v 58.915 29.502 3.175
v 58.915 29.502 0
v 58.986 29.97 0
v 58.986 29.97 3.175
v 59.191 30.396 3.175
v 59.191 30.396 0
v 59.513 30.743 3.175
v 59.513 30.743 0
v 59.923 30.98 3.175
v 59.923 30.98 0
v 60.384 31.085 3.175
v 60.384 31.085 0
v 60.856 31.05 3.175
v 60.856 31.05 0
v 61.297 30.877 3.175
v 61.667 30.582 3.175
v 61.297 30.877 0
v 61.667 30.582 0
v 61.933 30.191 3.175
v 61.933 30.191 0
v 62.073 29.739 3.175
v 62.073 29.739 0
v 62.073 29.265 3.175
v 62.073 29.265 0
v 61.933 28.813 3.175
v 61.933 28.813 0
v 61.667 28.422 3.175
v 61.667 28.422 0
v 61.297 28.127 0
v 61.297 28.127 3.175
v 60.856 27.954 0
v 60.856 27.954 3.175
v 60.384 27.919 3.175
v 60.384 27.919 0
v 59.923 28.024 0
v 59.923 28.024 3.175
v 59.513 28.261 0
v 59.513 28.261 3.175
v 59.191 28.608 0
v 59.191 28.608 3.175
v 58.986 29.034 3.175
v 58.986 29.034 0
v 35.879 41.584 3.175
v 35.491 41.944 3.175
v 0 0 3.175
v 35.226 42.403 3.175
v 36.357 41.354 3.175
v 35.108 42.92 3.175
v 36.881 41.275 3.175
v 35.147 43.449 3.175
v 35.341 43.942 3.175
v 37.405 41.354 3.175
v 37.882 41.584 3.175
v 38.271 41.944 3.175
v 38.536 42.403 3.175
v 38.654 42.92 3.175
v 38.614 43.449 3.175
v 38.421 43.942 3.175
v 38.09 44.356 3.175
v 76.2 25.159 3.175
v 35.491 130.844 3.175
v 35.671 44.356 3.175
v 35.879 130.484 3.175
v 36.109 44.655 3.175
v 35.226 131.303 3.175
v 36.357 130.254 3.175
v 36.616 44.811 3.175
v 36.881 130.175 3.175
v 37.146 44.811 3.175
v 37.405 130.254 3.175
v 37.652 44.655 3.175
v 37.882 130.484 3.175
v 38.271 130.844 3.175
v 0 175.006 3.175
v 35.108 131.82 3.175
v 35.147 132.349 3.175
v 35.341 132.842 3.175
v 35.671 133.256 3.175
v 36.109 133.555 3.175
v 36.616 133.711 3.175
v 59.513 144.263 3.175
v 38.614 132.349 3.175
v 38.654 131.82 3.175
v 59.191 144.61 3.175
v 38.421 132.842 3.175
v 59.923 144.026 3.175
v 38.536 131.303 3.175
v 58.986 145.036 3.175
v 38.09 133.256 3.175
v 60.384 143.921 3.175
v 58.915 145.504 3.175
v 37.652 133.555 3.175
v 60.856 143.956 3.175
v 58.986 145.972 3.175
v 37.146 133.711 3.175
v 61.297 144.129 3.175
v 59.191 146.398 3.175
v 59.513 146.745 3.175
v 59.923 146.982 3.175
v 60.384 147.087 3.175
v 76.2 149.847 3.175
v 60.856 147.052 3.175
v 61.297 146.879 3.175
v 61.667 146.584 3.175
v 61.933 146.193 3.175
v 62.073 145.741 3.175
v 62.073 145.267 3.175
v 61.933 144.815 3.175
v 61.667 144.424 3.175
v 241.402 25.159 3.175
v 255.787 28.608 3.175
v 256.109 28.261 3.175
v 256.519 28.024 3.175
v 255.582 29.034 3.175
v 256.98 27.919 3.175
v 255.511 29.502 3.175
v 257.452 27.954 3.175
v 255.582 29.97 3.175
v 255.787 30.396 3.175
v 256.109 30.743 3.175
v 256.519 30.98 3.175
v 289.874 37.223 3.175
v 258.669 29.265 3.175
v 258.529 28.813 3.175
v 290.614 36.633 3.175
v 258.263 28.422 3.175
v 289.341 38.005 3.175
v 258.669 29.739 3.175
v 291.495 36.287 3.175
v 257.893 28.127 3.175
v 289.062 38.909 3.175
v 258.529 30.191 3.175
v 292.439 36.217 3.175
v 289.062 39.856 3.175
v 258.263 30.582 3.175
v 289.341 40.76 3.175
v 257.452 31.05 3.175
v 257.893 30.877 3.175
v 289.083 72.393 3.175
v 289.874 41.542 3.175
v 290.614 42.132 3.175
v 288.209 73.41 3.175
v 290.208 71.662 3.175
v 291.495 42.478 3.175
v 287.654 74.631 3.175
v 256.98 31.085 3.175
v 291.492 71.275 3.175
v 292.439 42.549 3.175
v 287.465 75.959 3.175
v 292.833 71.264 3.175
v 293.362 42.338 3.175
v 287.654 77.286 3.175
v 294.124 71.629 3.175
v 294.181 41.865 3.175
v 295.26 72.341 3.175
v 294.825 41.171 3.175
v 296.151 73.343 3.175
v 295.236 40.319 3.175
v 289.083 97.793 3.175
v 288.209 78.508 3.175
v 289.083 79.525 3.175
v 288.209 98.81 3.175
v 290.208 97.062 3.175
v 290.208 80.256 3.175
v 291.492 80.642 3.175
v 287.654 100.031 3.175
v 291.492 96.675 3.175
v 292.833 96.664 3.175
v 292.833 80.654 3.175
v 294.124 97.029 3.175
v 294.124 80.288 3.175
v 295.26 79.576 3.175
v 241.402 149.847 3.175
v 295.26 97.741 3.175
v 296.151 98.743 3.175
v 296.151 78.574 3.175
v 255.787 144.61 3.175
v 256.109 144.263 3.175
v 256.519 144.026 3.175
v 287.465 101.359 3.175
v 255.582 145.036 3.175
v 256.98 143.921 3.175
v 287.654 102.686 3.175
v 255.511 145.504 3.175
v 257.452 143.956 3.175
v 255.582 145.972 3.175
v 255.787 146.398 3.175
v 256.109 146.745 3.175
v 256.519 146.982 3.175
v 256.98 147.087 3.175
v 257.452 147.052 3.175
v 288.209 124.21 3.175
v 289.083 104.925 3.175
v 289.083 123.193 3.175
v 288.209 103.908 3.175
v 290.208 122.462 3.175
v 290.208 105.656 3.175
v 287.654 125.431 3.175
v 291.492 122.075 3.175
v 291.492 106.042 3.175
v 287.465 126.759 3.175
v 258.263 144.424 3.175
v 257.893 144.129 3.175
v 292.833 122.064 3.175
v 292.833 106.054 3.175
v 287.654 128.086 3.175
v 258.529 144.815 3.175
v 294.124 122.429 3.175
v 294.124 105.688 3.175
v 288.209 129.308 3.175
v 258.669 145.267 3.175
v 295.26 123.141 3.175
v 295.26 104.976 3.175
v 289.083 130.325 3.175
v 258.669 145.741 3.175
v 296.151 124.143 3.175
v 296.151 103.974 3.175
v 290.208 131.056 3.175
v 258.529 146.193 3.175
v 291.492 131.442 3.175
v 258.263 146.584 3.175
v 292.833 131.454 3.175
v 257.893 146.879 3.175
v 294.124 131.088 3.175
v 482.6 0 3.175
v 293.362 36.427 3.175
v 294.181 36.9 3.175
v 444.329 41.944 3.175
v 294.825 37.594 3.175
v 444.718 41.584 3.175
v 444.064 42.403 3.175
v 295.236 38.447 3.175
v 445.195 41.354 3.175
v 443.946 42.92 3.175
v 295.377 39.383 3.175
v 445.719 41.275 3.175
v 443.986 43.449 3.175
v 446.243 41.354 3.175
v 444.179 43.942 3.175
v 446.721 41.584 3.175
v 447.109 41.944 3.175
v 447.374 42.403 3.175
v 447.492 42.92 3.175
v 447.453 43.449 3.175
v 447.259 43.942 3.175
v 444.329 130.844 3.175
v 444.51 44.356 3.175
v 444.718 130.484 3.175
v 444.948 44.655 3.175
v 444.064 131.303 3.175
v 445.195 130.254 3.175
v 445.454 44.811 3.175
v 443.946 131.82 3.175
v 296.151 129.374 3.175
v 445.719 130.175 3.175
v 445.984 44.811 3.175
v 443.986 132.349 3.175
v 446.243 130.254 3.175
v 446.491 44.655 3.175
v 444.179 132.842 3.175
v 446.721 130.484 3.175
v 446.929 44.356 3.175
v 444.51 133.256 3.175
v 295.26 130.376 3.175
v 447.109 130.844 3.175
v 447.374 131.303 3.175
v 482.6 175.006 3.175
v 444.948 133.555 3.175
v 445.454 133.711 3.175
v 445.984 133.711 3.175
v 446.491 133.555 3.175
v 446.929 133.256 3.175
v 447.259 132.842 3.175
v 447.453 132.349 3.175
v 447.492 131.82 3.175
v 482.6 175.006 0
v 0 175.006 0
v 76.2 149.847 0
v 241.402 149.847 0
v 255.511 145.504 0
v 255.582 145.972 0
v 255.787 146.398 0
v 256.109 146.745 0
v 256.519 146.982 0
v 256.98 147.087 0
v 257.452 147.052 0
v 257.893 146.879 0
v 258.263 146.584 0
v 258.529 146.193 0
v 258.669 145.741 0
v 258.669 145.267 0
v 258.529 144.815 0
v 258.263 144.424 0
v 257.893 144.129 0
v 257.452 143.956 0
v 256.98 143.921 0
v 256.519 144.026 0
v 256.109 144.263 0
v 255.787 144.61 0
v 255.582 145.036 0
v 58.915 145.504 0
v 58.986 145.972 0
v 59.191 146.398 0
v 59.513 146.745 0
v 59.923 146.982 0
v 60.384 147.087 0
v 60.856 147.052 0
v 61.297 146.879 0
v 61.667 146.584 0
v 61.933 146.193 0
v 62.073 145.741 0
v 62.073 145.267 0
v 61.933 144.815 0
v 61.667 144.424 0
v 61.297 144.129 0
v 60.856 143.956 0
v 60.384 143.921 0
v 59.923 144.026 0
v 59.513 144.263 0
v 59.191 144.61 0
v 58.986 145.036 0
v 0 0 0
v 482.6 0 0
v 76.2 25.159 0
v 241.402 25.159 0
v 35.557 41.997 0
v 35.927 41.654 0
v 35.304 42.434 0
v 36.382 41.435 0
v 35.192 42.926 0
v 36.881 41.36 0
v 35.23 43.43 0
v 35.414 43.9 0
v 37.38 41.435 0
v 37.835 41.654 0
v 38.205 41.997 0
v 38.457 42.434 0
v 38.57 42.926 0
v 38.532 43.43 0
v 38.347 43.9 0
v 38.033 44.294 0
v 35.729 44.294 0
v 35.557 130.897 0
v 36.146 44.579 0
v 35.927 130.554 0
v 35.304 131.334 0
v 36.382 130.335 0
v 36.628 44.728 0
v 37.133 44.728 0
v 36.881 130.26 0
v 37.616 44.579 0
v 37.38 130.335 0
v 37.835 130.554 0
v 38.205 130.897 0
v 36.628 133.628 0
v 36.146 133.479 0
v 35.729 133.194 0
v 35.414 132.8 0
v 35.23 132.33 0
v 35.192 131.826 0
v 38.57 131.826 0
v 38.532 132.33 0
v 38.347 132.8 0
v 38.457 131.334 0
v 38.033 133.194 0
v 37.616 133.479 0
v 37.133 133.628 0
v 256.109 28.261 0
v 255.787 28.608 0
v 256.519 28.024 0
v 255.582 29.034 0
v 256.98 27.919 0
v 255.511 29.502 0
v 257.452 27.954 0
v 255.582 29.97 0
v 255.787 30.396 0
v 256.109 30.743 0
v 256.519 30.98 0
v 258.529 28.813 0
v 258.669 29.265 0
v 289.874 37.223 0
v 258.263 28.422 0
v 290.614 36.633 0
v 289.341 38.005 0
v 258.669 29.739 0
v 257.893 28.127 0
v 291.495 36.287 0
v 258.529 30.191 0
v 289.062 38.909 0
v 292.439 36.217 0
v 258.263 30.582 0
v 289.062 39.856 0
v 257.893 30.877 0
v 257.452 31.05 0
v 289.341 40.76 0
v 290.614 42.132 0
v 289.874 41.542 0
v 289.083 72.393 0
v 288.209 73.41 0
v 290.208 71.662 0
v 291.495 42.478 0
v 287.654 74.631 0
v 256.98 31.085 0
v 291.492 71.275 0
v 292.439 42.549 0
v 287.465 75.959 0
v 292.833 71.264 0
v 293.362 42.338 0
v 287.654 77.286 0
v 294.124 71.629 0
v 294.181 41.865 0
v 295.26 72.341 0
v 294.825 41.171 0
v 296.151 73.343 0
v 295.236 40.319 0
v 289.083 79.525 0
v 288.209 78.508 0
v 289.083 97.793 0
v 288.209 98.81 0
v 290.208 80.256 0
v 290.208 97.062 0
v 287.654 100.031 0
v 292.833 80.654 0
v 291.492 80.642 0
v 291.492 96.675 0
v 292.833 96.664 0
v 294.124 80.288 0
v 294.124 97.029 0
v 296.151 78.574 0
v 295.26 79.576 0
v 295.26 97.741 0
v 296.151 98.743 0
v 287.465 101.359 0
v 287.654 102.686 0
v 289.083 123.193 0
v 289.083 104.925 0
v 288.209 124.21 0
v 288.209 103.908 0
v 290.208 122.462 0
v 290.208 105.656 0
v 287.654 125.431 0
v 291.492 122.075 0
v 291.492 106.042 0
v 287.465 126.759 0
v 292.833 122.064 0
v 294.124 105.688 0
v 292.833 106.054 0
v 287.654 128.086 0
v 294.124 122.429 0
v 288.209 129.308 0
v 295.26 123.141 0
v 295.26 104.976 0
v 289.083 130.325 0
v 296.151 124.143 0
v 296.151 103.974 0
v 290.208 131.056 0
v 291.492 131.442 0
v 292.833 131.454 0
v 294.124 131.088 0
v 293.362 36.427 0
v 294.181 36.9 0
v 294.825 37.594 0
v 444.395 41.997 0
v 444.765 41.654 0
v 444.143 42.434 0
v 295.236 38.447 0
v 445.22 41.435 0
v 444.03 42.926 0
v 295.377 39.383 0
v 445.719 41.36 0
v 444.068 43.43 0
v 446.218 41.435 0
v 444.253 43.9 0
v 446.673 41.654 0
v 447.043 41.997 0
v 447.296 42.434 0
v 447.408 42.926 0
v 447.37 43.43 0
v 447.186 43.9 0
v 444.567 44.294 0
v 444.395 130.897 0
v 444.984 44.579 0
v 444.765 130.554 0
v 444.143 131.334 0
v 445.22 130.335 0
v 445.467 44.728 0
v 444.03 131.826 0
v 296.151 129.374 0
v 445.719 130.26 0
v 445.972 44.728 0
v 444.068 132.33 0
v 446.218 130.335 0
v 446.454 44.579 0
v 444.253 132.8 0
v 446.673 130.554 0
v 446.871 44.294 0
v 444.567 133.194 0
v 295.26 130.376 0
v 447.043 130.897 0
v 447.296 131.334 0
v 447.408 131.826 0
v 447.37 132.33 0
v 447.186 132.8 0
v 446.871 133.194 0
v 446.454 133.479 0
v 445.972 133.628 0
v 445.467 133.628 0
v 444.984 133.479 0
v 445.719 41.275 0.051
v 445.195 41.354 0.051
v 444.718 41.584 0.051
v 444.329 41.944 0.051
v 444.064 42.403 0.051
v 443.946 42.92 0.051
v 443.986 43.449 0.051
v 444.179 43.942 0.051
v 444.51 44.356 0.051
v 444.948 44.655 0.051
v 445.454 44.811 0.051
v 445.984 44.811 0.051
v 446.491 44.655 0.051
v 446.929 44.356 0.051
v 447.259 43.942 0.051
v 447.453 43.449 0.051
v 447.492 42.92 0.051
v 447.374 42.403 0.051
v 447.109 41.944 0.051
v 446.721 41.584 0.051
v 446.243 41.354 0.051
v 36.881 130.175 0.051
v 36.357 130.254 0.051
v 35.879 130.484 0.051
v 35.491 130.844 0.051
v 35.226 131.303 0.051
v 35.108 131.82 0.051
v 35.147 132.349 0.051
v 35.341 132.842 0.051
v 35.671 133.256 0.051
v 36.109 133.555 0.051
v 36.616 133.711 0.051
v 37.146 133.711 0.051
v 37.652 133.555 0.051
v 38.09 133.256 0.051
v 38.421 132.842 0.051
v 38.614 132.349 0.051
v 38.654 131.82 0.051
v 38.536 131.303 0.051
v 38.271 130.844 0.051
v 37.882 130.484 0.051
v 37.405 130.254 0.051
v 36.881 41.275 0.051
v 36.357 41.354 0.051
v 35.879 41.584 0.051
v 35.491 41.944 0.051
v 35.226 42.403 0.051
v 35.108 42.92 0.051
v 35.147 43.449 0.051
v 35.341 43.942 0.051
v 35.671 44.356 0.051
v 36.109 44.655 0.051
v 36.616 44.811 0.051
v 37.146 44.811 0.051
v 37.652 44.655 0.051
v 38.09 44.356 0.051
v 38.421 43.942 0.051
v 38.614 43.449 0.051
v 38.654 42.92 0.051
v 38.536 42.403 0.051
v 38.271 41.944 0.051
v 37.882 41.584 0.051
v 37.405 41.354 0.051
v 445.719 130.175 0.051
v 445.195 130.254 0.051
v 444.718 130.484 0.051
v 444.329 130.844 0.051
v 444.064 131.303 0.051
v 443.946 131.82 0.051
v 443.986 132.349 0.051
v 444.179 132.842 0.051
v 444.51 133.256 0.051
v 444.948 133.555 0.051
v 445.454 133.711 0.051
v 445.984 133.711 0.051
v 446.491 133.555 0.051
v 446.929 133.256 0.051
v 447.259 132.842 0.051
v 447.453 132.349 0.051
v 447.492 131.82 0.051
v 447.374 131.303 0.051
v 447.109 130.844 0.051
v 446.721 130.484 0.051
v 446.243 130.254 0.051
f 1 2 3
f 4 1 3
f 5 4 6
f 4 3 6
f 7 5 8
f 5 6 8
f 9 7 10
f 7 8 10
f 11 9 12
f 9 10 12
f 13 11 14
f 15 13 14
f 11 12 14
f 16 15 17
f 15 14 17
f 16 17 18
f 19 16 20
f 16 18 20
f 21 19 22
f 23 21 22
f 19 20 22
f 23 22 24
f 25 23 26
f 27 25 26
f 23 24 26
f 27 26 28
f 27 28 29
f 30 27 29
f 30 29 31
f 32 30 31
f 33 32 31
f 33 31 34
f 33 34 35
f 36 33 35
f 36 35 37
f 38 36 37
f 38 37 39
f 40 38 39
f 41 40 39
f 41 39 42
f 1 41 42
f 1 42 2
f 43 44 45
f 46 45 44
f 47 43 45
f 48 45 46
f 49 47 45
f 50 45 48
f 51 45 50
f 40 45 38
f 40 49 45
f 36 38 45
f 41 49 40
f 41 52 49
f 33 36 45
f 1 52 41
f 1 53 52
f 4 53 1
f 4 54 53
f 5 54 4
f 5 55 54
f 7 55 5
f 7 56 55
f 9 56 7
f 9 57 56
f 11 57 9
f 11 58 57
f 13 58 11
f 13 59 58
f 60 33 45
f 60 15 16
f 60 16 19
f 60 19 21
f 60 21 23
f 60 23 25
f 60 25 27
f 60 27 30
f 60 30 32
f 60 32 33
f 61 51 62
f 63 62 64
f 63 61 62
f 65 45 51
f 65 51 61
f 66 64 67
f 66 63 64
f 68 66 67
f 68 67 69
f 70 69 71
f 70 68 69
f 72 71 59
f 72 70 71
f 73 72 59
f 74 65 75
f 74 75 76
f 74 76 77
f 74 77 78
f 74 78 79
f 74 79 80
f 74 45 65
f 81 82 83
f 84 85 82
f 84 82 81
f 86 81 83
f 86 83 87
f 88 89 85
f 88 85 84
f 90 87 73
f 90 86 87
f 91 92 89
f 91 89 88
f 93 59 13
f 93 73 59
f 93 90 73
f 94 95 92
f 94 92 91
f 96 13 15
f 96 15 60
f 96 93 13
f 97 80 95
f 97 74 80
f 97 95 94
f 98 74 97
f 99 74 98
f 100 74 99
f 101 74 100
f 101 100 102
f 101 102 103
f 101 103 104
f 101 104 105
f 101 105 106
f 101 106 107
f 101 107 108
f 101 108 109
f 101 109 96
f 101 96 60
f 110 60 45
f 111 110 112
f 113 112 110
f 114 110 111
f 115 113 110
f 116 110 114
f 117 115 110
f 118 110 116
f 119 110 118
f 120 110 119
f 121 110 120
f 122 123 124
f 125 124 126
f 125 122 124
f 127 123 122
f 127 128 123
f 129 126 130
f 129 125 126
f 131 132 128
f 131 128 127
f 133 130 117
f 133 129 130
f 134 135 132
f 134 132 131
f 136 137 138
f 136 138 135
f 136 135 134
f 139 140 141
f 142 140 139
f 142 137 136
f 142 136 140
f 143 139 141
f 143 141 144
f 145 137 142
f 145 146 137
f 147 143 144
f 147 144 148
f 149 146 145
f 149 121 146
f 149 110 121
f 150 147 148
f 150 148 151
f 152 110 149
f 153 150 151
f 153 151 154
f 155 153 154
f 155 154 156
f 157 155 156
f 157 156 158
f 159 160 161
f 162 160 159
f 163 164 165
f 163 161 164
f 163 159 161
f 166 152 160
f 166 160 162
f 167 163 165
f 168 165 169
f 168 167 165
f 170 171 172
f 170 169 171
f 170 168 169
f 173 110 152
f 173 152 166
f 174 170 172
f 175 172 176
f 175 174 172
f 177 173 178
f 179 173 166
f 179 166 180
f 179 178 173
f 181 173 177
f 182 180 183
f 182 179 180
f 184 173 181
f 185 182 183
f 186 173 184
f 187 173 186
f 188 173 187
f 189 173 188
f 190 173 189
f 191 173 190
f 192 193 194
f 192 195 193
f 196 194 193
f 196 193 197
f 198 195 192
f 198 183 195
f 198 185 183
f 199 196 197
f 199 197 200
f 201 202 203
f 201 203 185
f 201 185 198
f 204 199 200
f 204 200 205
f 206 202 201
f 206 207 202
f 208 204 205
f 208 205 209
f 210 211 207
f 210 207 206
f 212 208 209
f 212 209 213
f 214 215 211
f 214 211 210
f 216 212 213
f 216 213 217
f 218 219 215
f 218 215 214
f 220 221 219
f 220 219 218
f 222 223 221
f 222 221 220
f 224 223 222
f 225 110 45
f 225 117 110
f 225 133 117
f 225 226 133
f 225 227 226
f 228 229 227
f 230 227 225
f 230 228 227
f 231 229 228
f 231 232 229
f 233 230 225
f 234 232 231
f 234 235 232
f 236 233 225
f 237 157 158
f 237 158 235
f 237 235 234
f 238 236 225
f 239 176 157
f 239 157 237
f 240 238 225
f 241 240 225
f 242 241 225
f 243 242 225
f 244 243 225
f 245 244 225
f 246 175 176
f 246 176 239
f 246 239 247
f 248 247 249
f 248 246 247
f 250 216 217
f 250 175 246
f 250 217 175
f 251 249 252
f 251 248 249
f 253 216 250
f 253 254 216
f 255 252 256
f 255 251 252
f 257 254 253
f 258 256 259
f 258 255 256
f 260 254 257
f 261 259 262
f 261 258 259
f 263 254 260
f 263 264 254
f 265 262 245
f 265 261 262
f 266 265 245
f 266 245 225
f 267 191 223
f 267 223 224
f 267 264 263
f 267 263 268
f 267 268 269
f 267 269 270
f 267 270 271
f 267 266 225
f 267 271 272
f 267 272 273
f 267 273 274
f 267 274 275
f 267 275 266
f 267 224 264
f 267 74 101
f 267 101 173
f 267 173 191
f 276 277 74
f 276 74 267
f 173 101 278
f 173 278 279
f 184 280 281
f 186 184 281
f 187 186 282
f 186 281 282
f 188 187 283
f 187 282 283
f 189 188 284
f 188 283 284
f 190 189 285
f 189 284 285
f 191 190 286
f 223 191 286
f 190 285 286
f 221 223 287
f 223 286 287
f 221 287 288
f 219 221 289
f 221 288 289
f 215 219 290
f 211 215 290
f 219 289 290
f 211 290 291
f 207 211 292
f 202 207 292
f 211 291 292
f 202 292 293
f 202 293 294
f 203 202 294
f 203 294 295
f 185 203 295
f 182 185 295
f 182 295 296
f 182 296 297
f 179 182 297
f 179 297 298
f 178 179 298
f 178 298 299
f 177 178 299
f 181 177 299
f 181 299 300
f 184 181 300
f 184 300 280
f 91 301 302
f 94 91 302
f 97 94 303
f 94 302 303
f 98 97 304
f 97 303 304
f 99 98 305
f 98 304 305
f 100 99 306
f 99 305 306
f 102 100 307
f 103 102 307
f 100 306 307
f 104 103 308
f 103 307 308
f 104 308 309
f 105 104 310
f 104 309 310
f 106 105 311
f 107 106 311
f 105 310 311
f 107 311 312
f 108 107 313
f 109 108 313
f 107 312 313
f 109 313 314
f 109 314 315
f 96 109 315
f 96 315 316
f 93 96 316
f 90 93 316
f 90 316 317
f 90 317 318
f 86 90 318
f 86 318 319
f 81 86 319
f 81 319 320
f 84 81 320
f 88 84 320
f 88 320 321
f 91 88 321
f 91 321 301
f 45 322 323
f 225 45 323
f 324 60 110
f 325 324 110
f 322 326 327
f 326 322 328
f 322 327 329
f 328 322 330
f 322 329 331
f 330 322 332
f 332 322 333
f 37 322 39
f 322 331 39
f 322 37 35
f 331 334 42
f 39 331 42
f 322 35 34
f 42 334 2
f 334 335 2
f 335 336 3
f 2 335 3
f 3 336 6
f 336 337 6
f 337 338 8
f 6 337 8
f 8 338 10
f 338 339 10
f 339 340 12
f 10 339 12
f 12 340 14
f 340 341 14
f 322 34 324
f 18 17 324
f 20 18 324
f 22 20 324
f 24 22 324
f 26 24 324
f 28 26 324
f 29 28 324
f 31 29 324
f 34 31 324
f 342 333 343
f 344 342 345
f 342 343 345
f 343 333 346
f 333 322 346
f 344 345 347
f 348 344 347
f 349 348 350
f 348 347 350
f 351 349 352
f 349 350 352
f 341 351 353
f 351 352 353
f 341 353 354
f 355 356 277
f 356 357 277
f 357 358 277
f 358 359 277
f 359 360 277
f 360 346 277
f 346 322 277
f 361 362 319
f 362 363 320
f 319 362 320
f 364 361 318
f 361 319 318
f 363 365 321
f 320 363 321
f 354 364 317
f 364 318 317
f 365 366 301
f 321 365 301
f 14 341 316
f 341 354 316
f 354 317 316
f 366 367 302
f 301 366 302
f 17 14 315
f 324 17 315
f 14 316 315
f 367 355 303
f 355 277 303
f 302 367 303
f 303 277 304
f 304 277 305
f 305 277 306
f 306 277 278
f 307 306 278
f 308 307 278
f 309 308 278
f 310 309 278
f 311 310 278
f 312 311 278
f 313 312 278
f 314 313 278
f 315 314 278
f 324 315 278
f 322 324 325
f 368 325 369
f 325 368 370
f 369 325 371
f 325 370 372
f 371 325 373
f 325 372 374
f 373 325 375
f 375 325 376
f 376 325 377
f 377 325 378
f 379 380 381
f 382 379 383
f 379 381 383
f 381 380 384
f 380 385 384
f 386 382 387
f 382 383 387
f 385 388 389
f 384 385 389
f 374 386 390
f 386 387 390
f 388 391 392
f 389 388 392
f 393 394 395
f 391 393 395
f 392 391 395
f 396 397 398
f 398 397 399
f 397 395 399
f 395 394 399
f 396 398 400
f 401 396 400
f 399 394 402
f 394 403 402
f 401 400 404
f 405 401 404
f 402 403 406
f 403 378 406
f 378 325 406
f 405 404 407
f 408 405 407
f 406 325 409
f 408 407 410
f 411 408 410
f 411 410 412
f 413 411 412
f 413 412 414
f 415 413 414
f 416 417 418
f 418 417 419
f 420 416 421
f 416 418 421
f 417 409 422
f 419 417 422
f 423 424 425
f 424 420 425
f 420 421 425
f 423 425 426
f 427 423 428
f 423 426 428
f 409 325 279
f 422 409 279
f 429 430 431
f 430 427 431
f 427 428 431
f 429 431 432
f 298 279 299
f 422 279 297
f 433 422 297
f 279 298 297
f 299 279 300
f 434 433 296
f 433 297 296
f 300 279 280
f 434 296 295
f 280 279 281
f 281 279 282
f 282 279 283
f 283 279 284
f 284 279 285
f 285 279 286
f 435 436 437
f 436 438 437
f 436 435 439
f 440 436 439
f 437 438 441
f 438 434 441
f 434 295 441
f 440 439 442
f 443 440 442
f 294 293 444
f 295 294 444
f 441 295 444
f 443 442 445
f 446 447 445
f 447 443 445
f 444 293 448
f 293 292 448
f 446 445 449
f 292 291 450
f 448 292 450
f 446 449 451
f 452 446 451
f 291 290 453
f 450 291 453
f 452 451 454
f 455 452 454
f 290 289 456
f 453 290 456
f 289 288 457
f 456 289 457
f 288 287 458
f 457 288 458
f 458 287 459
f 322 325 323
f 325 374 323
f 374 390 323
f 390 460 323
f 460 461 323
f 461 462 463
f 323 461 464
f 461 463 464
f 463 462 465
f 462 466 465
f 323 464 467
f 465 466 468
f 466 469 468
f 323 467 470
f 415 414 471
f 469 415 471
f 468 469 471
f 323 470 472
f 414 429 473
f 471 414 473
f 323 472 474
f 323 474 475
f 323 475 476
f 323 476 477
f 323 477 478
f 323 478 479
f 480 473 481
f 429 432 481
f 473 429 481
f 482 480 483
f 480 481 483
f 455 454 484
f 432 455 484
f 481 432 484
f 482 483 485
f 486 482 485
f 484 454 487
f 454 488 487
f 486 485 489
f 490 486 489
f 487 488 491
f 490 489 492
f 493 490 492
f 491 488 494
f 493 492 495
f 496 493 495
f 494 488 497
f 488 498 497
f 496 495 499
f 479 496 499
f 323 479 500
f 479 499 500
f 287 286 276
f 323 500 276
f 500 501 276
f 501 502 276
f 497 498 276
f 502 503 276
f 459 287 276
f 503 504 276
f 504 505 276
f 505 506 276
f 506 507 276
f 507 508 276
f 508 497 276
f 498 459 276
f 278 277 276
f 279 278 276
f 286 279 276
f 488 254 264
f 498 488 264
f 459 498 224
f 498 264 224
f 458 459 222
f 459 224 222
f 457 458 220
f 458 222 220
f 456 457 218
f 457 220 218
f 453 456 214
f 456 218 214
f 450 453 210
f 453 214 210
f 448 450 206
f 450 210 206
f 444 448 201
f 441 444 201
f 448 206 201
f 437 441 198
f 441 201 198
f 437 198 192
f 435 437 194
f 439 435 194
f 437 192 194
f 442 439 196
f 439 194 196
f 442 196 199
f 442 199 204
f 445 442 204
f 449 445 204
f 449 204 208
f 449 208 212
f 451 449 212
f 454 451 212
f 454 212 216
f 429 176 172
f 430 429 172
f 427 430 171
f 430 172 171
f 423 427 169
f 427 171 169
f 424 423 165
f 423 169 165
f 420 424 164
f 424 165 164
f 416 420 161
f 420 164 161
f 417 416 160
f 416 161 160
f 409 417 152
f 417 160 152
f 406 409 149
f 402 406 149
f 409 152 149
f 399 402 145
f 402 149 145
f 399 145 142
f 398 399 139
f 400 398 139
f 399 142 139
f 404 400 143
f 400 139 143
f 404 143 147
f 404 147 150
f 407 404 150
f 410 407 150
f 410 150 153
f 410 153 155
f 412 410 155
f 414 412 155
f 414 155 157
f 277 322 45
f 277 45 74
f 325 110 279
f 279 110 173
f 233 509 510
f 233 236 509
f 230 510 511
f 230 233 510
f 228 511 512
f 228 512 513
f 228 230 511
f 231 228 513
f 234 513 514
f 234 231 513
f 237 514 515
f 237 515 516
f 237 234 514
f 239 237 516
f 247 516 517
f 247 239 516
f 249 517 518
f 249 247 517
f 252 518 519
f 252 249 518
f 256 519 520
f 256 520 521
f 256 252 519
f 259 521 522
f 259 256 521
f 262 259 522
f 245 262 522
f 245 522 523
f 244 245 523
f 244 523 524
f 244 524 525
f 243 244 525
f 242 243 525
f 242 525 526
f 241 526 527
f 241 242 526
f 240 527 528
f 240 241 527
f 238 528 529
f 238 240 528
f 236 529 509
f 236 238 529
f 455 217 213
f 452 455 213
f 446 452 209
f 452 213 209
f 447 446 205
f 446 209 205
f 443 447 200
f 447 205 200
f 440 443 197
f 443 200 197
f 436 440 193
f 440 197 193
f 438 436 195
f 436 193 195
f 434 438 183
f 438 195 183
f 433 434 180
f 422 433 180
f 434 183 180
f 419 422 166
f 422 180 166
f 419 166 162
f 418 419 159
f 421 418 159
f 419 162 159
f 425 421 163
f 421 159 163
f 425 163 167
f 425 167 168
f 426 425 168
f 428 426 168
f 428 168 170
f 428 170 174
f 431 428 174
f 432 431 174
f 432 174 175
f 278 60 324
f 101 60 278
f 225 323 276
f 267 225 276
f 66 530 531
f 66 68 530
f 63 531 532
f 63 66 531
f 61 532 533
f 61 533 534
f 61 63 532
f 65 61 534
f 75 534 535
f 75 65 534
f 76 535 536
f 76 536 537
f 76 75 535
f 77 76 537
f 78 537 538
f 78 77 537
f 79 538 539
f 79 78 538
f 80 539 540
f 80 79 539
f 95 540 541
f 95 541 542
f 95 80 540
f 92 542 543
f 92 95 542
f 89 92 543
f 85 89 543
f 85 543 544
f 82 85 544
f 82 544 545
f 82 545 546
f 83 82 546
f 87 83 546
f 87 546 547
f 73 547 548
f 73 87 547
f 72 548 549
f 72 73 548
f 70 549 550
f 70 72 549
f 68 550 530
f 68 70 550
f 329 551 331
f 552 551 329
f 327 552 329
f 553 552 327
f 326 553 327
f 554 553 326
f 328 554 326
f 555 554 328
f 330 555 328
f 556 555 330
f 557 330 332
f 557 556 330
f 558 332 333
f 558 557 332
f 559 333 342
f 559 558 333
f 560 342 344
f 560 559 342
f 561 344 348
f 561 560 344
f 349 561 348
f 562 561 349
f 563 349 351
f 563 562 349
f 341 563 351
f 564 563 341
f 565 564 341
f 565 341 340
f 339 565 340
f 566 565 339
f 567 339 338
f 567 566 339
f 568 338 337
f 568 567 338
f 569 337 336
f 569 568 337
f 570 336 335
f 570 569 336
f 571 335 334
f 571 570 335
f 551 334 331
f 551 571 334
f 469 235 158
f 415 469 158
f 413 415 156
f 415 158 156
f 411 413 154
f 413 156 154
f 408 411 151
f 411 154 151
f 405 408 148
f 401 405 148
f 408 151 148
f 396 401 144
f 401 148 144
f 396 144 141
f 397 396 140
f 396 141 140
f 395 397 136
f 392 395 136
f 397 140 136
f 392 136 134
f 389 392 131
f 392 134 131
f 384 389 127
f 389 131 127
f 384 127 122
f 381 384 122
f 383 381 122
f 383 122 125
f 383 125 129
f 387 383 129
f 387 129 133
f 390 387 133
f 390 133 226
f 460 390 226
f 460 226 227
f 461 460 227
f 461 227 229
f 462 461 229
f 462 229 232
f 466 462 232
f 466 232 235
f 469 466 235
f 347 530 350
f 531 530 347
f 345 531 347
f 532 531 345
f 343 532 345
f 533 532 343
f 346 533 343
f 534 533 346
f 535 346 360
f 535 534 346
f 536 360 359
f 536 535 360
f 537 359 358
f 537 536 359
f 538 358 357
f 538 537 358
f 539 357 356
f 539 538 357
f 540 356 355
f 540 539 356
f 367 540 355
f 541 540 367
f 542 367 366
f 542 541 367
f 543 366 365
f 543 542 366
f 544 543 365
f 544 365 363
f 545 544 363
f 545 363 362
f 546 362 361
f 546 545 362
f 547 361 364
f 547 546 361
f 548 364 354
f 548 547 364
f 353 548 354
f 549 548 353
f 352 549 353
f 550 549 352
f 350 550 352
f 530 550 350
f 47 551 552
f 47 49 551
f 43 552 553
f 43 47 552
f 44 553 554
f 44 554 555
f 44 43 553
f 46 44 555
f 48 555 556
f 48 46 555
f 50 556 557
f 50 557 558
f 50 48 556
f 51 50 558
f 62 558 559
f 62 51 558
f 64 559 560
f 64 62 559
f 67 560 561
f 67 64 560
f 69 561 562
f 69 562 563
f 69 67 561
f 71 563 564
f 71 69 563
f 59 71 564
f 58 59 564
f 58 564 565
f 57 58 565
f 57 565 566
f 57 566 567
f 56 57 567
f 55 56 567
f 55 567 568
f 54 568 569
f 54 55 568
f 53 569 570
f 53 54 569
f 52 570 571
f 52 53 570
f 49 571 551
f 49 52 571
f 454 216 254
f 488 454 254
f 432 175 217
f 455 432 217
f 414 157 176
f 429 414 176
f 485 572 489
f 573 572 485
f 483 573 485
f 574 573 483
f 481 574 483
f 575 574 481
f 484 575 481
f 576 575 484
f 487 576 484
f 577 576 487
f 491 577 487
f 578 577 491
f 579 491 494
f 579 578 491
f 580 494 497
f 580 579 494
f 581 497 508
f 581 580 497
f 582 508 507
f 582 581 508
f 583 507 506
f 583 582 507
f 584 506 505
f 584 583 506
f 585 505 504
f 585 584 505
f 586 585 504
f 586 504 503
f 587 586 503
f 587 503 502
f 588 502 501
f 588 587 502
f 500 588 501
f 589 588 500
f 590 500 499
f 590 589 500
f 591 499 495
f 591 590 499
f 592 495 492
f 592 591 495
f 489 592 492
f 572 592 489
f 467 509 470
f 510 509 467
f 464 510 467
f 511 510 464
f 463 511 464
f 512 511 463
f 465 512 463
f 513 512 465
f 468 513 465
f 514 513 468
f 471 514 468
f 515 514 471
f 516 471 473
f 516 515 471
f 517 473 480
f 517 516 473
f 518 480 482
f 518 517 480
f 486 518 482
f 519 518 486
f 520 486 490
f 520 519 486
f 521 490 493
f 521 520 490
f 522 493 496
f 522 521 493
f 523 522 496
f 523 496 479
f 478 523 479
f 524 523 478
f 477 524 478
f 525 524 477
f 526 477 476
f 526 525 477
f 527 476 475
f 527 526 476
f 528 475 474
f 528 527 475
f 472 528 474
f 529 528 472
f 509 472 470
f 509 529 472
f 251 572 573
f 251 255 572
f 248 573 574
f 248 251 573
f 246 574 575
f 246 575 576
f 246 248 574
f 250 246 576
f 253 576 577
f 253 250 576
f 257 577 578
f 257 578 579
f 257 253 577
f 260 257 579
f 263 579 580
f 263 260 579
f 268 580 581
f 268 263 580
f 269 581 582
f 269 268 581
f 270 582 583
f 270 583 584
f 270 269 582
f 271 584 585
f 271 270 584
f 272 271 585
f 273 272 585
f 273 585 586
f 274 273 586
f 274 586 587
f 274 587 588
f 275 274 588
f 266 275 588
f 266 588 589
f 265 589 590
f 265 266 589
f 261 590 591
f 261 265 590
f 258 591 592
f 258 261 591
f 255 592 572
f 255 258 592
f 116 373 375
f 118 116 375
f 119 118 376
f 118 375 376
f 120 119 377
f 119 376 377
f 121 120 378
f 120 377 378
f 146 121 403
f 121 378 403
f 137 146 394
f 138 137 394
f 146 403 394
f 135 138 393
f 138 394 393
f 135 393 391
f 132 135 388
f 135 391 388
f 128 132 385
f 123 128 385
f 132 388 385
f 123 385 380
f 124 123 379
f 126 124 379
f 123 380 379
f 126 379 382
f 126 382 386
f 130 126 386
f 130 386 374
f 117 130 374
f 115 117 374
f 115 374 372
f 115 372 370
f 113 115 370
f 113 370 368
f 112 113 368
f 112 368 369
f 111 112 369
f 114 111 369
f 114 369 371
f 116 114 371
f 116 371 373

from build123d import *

# Parameters (mm, degrees)
SKETCH1_W                    = 482.6
SKETCH1_H                    = 175.006
BASE_FLANGE_DEPTH            = 3.175
SKETCH2_W                    = 165.2016
SKETCH2_H                    = 124.6886
CUT_EXTRUDE1_DEPTH           = 514.361413296
F_1_8_0_125_DIAMETER_HOLE1_D = 3.175
LPATTERN1_COUNT              = 2
LPATTERN1_PITCH              = 116.0018
LPATTERN1_COUNT_DIR2         = 2
LPATTERN1_PITCH_DIR2         = 196.596
CUT_EXTRUDE2_DEPTH           = 514.361413296
LPATTERN2_COUNT              = 3
LPATTERN2_PITCH              = 25.4
SKETCH5_R                    = 3.175
CUT_EXTRUDE3_DEPTH           = 514.361413296
LPATTERN3_COUNT              = 2
LPATTERN3_PITCH              = 408.8384
LPATTERN3_COUNT_DIR2         = 2
LPATTERN3_PITCH_DIR2         = 88.9


# Sheet-metal steps are written as plain solids
with BuildPart() as part:
    # Sketch1 → Base-Flange (new body)
    with BuildSketch(Plane.XY):
        with Locations((241.3, 87.503)):
            Rectangle(SKETCH1_W, SKETCH1_H)
    extrude(amount=BASE_FLANGE_DEPTH)

    # Sketch2 → Cut-Extrude1 (cut, through all)
    with BuildSketch(Plane.XY.offset(3.175)):
        with Locations((158.8008, 87.503)):
            Rectangle(SKETCH2_W, SKETCH2_H)
    extrude(amount=-CUT_EXTRUDE1_DEPTH, mode=Mode.SUBTRACT)

    # 1/8 (0.125) Diameter Hole1 (through all)
    with Locations(Plane(origin=(60.5028, 29.5021, 3.175), x_dir=(1, 0, 0), z_dir=(0, 0, 1))):
        with Locations((0, 0)):
            f_1_8_0_125_diameter_hole1 = Hole(F_1_8_0_125_DIAMETER_HOLE1_D / 2)

    # LPattern1: 1_8 _0.125_ Diameter Hole1 2 × 2
    with Locations(*[(j * LPATTERN1_PITCH_DIR2, i * LPATTERN1_PITCH, 0) for i in range(LPATTERN1_COUNT) for j in range(LPATTERN1_COUNT_DIR2) if (i, j) != (0, 0)]):
        add(f_1_8_0_125_diameter_hole1, mode=Mode.SUBTRACT)

    # Sketch4 → Cut-Extrude2 (cut, through all)
    with BuildSketch(Plane.XY.offset(3.175)):
        with BuildLine():
            Line((296.1513, 73.343363249), (296.1513, 78.574036751))
            ThreePointArc((296.1513, 78.574036751), (287.4645, 75.9587), (296.1513, 73.343363249))
        make_face()
    cut_extrude2 = extrude(amount=-CUT_EXTRUDE2_DEPTH, mode=Mode.SUBTRACT)

    # LPattern2: Cut-Extrude2 ×3
    with Locations(*[(0, i * LPATTERN2_PITCH, 0) for i in range(1, LPATTERN2_COUNT)]):
        add(cut_extrude2, mode=Mode.SUBTRACT)

    # Sketch5 → Cut-Extrude3 (cut, through all)
    with BuildSketch(Plane.XY.offset(3.175)):
        with Locations((292.2016, 39.3827)):
            Circle(SKETCH5_R)
    extrude(amount=-CUT_EXTRUDE3_DEPTH, mode=Mode.SUBTRACT)

    # Sketch6 → #40 (0.098) Diameter Hole1 (revolve, cut)
    with BuildSketch(Plane(origin=(36.8808, 43.053, 3.175), x_dir=(0, -1, 0), z_dir=(1, 0, 0))):
        Polygon((0, 0), (0, 4.192530181), (1.778, 3.1242), (1.778, 0), align=None)
    f_40_0_098_diameter_hole1 = revolve(axis=Axis((36.8808, 43.053, 9.525), (0, 0, -1)), mode=Mode.SUBTRACT)

    # LPattern3: 40 _0.098_ Diameter Hole1 2 × 2
    with Locations(*[(i * LPATTERN3_PITCH, j * LPATTERN3_PITCH_DIR2, 0) for i in range(LPATTERN3_COUNT) for j in range(LPATTERN3_COUNT_DIR2) if (i, j) != (0, 0)]):
        add(f_40_0_098_diameter_hole1, mode=Mode.SUBTRACT)


solid = part.part
